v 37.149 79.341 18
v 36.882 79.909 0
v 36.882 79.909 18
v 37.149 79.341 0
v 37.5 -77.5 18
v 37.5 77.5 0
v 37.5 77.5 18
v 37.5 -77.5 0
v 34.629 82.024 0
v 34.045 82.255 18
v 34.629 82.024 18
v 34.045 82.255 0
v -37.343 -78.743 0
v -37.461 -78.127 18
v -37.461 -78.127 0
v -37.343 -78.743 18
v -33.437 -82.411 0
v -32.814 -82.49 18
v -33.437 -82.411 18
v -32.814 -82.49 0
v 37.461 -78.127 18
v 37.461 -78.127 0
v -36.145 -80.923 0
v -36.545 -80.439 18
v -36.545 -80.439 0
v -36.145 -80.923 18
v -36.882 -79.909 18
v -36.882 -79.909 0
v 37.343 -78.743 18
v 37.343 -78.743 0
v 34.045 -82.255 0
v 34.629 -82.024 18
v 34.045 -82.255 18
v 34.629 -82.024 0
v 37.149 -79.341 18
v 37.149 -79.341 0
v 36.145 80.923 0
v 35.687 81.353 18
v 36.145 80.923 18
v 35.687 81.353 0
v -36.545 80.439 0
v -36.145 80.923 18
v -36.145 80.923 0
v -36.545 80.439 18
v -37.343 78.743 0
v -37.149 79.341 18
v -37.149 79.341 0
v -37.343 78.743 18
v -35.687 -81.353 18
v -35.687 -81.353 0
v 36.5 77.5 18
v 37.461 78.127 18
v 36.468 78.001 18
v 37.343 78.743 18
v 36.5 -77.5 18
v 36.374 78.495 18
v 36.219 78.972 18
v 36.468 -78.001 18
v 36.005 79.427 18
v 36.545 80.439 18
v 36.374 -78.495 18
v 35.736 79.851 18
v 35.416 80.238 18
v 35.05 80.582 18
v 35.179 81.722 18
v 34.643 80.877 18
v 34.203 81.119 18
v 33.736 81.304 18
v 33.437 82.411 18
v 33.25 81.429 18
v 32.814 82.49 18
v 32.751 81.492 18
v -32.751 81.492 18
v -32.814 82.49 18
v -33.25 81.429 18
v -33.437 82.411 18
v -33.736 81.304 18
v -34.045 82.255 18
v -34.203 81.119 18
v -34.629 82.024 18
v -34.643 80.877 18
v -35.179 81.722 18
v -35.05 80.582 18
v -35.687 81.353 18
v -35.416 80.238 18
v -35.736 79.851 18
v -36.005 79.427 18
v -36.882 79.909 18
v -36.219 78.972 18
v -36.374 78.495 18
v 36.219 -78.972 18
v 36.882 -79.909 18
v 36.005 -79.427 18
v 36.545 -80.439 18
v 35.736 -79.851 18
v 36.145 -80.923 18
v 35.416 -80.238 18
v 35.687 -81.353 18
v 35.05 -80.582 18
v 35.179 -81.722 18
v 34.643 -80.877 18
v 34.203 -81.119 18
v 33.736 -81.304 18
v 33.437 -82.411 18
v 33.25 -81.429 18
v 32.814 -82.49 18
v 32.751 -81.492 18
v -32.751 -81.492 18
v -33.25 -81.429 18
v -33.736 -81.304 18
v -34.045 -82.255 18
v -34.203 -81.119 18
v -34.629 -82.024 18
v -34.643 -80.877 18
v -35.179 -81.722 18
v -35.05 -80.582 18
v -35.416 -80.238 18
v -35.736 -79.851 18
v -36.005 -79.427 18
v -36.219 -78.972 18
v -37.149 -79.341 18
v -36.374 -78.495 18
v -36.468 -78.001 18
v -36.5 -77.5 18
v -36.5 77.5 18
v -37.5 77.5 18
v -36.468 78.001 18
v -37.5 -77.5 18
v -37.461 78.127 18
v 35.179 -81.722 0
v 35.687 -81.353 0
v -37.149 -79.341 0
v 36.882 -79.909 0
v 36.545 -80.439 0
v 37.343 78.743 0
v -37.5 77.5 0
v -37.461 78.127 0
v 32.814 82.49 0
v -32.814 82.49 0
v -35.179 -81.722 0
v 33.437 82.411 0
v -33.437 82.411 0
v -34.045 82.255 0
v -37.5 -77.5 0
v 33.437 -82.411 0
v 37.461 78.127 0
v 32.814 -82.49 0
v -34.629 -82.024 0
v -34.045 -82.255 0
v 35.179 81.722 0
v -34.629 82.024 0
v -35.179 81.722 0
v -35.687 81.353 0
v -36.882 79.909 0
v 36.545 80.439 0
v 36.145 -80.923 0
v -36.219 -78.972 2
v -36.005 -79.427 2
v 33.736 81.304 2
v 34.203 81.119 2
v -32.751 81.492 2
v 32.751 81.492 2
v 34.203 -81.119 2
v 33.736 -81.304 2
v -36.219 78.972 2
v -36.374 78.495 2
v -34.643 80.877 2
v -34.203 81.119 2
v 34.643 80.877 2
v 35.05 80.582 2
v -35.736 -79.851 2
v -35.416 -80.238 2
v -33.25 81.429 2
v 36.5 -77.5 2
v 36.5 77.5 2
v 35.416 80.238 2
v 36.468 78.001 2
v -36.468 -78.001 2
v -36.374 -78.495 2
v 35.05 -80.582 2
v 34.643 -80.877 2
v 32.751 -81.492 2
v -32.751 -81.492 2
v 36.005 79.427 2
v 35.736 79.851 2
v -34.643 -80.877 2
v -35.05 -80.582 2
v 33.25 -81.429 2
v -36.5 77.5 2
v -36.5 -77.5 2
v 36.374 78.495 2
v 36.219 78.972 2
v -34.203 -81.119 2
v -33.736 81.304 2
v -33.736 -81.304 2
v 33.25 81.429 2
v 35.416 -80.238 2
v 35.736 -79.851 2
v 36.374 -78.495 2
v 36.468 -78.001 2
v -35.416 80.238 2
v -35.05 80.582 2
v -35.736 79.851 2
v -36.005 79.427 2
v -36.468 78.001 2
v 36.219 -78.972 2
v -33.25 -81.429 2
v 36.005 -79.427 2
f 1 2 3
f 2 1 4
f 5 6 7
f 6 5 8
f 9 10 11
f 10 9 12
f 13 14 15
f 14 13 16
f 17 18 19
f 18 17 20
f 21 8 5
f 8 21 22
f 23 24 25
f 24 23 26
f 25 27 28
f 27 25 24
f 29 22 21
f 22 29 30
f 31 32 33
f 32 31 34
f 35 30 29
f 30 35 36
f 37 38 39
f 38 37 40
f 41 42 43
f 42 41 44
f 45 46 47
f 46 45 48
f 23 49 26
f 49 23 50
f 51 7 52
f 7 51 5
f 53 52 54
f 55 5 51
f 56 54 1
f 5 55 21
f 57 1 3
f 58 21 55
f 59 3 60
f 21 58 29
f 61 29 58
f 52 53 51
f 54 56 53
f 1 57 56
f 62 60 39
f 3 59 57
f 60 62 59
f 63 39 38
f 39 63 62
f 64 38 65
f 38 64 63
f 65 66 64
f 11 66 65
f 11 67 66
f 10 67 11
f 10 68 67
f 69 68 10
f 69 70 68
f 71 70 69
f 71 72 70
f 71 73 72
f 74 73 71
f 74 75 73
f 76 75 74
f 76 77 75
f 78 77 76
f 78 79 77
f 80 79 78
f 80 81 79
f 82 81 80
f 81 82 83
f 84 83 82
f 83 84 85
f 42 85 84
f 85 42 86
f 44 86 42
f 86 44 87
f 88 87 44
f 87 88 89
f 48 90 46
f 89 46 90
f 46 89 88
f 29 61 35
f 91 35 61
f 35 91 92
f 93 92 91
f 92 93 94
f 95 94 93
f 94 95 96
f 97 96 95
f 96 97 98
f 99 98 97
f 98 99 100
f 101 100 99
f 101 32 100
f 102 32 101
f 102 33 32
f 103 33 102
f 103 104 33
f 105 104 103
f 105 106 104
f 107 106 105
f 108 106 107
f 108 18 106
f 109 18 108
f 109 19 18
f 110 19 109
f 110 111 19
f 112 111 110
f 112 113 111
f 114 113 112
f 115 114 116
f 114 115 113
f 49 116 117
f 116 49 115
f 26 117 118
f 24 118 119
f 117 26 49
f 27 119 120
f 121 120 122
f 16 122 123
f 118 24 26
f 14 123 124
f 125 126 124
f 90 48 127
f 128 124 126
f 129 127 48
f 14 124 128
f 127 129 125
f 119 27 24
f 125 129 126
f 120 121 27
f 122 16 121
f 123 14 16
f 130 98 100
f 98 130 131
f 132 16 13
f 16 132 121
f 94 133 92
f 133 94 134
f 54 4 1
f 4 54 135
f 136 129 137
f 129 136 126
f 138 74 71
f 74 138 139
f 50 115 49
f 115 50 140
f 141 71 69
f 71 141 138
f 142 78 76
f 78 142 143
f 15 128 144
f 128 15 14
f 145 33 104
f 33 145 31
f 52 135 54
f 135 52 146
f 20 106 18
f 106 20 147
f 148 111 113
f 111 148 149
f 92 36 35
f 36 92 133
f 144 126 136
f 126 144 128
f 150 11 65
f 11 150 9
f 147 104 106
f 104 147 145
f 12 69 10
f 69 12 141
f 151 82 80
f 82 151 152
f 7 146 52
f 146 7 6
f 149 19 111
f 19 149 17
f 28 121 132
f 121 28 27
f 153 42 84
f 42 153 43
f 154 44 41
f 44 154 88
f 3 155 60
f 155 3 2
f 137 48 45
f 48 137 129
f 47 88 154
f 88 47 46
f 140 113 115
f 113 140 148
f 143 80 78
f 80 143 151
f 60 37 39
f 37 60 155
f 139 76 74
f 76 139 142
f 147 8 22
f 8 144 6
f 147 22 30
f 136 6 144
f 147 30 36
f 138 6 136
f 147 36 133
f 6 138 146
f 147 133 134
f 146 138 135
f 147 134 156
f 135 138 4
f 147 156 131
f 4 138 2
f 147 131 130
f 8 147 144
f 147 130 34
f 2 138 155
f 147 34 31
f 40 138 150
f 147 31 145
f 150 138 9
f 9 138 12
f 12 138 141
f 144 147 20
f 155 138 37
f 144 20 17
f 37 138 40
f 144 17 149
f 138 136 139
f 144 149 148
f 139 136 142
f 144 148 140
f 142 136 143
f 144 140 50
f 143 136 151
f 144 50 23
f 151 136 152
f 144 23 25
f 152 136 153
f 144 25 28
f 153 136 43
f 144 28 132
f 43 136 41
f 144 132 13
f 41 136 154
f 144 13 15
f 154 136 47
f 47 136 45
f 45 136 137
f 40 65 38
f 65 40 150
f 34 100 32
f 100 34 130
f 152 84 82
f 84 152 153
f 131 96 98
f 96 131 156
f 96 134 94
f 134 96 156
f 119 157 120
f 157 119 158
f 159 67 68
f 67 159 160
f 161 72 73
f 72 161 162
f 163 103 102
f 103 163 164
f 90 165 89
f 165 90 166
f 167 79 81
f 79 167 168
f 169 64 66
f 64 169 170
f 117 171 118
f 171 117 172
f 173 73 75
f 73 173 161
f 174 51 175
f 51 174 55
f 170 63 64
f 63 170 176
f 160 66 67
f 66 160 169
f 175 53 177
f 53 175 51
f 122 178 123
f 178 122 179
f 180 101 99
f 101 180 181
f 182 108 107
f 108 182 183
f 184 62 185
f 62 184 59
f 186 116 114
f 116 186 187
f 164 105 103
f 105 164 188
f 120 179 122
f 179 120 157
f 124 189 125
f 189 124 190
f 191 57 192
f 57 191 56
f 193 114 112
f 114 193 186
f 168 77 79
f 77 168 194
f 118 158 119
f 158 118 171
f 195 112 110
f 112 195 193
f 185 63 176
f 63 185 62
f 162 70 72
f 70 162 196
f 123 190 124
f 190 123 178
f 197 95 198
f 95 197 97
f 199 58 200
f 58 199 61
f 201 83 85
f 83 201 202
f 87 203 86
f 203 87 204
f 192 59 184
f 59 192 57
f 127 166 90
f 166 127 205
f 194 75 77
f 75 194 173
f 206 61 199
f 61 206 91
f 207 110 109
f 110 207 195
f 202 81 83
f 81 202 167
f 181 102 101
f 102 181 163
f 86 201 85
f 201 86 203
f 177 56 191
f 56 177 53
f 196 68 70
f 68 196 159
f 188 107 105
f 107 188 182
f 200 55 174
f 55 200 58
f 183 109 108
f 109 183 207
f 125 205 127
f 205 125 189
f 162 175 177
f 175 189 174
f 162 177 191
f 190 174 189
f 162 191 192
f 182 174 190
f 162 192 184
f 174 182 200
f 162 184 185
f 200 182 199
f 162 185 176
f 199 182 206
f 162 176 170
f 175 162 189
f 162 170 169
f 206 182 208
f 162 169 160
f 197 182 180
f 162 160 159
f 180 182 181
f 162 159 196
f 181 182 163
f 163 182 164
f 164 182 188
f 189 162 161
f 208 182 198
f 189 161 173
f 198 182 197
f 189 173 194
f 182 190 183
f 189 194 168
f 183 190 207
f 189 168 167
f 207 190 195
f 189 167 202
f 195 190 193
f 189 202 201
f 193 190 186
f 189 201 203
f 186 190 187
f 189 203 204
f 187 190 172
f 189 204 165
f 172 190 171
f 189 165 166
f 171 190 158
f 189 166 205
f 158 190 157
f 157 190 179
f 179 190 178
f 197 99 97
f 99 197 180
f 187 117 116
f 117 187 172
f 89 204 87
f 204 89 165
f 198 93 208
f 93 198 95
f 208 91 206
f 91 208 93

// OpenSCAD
$fn = 50;


difference() {
	union() {
		hull() {
			translate(v = [-32.5000000000, 77.5000000000, 0]) {
				cylinder(h = 18, r = 5);
			}
			translate(v = [32.5000000000, 77.5000000000, 0]) {
				cylinder(h = 18, r = 5);
			}
			translate(v = [-32.5000000000, -77.5000000000, 0]) {
				cylinder(h = 18, r = 5);
			}
			translate(v = [32.5000000000, -77.5000000000, 0]) {
				cylinder(h = 18, r = 5);
			}
		}
	}
	union() {
		translate(v = [0, 0, 2]) {
			hull() {
				translate(v = [-32.5000000000, 77.5000000000, 0]) {
					cylinder(h = 16, r = 4);
				}
				translate(v = [32.5000000000, 77.5000000000, 0]) {
					cylinder(h = 16, r = 4);
				}
				translate(v = [-32.5000000000, -77.5000000000, 0]) {
					cylinder(h = 16, r = 4);
				}
				translate(v = [32.5000000000, -77.5000000000, 0]) {
					cylinder(h = 16, r = 4);
				}
			}
		}
	}
}
